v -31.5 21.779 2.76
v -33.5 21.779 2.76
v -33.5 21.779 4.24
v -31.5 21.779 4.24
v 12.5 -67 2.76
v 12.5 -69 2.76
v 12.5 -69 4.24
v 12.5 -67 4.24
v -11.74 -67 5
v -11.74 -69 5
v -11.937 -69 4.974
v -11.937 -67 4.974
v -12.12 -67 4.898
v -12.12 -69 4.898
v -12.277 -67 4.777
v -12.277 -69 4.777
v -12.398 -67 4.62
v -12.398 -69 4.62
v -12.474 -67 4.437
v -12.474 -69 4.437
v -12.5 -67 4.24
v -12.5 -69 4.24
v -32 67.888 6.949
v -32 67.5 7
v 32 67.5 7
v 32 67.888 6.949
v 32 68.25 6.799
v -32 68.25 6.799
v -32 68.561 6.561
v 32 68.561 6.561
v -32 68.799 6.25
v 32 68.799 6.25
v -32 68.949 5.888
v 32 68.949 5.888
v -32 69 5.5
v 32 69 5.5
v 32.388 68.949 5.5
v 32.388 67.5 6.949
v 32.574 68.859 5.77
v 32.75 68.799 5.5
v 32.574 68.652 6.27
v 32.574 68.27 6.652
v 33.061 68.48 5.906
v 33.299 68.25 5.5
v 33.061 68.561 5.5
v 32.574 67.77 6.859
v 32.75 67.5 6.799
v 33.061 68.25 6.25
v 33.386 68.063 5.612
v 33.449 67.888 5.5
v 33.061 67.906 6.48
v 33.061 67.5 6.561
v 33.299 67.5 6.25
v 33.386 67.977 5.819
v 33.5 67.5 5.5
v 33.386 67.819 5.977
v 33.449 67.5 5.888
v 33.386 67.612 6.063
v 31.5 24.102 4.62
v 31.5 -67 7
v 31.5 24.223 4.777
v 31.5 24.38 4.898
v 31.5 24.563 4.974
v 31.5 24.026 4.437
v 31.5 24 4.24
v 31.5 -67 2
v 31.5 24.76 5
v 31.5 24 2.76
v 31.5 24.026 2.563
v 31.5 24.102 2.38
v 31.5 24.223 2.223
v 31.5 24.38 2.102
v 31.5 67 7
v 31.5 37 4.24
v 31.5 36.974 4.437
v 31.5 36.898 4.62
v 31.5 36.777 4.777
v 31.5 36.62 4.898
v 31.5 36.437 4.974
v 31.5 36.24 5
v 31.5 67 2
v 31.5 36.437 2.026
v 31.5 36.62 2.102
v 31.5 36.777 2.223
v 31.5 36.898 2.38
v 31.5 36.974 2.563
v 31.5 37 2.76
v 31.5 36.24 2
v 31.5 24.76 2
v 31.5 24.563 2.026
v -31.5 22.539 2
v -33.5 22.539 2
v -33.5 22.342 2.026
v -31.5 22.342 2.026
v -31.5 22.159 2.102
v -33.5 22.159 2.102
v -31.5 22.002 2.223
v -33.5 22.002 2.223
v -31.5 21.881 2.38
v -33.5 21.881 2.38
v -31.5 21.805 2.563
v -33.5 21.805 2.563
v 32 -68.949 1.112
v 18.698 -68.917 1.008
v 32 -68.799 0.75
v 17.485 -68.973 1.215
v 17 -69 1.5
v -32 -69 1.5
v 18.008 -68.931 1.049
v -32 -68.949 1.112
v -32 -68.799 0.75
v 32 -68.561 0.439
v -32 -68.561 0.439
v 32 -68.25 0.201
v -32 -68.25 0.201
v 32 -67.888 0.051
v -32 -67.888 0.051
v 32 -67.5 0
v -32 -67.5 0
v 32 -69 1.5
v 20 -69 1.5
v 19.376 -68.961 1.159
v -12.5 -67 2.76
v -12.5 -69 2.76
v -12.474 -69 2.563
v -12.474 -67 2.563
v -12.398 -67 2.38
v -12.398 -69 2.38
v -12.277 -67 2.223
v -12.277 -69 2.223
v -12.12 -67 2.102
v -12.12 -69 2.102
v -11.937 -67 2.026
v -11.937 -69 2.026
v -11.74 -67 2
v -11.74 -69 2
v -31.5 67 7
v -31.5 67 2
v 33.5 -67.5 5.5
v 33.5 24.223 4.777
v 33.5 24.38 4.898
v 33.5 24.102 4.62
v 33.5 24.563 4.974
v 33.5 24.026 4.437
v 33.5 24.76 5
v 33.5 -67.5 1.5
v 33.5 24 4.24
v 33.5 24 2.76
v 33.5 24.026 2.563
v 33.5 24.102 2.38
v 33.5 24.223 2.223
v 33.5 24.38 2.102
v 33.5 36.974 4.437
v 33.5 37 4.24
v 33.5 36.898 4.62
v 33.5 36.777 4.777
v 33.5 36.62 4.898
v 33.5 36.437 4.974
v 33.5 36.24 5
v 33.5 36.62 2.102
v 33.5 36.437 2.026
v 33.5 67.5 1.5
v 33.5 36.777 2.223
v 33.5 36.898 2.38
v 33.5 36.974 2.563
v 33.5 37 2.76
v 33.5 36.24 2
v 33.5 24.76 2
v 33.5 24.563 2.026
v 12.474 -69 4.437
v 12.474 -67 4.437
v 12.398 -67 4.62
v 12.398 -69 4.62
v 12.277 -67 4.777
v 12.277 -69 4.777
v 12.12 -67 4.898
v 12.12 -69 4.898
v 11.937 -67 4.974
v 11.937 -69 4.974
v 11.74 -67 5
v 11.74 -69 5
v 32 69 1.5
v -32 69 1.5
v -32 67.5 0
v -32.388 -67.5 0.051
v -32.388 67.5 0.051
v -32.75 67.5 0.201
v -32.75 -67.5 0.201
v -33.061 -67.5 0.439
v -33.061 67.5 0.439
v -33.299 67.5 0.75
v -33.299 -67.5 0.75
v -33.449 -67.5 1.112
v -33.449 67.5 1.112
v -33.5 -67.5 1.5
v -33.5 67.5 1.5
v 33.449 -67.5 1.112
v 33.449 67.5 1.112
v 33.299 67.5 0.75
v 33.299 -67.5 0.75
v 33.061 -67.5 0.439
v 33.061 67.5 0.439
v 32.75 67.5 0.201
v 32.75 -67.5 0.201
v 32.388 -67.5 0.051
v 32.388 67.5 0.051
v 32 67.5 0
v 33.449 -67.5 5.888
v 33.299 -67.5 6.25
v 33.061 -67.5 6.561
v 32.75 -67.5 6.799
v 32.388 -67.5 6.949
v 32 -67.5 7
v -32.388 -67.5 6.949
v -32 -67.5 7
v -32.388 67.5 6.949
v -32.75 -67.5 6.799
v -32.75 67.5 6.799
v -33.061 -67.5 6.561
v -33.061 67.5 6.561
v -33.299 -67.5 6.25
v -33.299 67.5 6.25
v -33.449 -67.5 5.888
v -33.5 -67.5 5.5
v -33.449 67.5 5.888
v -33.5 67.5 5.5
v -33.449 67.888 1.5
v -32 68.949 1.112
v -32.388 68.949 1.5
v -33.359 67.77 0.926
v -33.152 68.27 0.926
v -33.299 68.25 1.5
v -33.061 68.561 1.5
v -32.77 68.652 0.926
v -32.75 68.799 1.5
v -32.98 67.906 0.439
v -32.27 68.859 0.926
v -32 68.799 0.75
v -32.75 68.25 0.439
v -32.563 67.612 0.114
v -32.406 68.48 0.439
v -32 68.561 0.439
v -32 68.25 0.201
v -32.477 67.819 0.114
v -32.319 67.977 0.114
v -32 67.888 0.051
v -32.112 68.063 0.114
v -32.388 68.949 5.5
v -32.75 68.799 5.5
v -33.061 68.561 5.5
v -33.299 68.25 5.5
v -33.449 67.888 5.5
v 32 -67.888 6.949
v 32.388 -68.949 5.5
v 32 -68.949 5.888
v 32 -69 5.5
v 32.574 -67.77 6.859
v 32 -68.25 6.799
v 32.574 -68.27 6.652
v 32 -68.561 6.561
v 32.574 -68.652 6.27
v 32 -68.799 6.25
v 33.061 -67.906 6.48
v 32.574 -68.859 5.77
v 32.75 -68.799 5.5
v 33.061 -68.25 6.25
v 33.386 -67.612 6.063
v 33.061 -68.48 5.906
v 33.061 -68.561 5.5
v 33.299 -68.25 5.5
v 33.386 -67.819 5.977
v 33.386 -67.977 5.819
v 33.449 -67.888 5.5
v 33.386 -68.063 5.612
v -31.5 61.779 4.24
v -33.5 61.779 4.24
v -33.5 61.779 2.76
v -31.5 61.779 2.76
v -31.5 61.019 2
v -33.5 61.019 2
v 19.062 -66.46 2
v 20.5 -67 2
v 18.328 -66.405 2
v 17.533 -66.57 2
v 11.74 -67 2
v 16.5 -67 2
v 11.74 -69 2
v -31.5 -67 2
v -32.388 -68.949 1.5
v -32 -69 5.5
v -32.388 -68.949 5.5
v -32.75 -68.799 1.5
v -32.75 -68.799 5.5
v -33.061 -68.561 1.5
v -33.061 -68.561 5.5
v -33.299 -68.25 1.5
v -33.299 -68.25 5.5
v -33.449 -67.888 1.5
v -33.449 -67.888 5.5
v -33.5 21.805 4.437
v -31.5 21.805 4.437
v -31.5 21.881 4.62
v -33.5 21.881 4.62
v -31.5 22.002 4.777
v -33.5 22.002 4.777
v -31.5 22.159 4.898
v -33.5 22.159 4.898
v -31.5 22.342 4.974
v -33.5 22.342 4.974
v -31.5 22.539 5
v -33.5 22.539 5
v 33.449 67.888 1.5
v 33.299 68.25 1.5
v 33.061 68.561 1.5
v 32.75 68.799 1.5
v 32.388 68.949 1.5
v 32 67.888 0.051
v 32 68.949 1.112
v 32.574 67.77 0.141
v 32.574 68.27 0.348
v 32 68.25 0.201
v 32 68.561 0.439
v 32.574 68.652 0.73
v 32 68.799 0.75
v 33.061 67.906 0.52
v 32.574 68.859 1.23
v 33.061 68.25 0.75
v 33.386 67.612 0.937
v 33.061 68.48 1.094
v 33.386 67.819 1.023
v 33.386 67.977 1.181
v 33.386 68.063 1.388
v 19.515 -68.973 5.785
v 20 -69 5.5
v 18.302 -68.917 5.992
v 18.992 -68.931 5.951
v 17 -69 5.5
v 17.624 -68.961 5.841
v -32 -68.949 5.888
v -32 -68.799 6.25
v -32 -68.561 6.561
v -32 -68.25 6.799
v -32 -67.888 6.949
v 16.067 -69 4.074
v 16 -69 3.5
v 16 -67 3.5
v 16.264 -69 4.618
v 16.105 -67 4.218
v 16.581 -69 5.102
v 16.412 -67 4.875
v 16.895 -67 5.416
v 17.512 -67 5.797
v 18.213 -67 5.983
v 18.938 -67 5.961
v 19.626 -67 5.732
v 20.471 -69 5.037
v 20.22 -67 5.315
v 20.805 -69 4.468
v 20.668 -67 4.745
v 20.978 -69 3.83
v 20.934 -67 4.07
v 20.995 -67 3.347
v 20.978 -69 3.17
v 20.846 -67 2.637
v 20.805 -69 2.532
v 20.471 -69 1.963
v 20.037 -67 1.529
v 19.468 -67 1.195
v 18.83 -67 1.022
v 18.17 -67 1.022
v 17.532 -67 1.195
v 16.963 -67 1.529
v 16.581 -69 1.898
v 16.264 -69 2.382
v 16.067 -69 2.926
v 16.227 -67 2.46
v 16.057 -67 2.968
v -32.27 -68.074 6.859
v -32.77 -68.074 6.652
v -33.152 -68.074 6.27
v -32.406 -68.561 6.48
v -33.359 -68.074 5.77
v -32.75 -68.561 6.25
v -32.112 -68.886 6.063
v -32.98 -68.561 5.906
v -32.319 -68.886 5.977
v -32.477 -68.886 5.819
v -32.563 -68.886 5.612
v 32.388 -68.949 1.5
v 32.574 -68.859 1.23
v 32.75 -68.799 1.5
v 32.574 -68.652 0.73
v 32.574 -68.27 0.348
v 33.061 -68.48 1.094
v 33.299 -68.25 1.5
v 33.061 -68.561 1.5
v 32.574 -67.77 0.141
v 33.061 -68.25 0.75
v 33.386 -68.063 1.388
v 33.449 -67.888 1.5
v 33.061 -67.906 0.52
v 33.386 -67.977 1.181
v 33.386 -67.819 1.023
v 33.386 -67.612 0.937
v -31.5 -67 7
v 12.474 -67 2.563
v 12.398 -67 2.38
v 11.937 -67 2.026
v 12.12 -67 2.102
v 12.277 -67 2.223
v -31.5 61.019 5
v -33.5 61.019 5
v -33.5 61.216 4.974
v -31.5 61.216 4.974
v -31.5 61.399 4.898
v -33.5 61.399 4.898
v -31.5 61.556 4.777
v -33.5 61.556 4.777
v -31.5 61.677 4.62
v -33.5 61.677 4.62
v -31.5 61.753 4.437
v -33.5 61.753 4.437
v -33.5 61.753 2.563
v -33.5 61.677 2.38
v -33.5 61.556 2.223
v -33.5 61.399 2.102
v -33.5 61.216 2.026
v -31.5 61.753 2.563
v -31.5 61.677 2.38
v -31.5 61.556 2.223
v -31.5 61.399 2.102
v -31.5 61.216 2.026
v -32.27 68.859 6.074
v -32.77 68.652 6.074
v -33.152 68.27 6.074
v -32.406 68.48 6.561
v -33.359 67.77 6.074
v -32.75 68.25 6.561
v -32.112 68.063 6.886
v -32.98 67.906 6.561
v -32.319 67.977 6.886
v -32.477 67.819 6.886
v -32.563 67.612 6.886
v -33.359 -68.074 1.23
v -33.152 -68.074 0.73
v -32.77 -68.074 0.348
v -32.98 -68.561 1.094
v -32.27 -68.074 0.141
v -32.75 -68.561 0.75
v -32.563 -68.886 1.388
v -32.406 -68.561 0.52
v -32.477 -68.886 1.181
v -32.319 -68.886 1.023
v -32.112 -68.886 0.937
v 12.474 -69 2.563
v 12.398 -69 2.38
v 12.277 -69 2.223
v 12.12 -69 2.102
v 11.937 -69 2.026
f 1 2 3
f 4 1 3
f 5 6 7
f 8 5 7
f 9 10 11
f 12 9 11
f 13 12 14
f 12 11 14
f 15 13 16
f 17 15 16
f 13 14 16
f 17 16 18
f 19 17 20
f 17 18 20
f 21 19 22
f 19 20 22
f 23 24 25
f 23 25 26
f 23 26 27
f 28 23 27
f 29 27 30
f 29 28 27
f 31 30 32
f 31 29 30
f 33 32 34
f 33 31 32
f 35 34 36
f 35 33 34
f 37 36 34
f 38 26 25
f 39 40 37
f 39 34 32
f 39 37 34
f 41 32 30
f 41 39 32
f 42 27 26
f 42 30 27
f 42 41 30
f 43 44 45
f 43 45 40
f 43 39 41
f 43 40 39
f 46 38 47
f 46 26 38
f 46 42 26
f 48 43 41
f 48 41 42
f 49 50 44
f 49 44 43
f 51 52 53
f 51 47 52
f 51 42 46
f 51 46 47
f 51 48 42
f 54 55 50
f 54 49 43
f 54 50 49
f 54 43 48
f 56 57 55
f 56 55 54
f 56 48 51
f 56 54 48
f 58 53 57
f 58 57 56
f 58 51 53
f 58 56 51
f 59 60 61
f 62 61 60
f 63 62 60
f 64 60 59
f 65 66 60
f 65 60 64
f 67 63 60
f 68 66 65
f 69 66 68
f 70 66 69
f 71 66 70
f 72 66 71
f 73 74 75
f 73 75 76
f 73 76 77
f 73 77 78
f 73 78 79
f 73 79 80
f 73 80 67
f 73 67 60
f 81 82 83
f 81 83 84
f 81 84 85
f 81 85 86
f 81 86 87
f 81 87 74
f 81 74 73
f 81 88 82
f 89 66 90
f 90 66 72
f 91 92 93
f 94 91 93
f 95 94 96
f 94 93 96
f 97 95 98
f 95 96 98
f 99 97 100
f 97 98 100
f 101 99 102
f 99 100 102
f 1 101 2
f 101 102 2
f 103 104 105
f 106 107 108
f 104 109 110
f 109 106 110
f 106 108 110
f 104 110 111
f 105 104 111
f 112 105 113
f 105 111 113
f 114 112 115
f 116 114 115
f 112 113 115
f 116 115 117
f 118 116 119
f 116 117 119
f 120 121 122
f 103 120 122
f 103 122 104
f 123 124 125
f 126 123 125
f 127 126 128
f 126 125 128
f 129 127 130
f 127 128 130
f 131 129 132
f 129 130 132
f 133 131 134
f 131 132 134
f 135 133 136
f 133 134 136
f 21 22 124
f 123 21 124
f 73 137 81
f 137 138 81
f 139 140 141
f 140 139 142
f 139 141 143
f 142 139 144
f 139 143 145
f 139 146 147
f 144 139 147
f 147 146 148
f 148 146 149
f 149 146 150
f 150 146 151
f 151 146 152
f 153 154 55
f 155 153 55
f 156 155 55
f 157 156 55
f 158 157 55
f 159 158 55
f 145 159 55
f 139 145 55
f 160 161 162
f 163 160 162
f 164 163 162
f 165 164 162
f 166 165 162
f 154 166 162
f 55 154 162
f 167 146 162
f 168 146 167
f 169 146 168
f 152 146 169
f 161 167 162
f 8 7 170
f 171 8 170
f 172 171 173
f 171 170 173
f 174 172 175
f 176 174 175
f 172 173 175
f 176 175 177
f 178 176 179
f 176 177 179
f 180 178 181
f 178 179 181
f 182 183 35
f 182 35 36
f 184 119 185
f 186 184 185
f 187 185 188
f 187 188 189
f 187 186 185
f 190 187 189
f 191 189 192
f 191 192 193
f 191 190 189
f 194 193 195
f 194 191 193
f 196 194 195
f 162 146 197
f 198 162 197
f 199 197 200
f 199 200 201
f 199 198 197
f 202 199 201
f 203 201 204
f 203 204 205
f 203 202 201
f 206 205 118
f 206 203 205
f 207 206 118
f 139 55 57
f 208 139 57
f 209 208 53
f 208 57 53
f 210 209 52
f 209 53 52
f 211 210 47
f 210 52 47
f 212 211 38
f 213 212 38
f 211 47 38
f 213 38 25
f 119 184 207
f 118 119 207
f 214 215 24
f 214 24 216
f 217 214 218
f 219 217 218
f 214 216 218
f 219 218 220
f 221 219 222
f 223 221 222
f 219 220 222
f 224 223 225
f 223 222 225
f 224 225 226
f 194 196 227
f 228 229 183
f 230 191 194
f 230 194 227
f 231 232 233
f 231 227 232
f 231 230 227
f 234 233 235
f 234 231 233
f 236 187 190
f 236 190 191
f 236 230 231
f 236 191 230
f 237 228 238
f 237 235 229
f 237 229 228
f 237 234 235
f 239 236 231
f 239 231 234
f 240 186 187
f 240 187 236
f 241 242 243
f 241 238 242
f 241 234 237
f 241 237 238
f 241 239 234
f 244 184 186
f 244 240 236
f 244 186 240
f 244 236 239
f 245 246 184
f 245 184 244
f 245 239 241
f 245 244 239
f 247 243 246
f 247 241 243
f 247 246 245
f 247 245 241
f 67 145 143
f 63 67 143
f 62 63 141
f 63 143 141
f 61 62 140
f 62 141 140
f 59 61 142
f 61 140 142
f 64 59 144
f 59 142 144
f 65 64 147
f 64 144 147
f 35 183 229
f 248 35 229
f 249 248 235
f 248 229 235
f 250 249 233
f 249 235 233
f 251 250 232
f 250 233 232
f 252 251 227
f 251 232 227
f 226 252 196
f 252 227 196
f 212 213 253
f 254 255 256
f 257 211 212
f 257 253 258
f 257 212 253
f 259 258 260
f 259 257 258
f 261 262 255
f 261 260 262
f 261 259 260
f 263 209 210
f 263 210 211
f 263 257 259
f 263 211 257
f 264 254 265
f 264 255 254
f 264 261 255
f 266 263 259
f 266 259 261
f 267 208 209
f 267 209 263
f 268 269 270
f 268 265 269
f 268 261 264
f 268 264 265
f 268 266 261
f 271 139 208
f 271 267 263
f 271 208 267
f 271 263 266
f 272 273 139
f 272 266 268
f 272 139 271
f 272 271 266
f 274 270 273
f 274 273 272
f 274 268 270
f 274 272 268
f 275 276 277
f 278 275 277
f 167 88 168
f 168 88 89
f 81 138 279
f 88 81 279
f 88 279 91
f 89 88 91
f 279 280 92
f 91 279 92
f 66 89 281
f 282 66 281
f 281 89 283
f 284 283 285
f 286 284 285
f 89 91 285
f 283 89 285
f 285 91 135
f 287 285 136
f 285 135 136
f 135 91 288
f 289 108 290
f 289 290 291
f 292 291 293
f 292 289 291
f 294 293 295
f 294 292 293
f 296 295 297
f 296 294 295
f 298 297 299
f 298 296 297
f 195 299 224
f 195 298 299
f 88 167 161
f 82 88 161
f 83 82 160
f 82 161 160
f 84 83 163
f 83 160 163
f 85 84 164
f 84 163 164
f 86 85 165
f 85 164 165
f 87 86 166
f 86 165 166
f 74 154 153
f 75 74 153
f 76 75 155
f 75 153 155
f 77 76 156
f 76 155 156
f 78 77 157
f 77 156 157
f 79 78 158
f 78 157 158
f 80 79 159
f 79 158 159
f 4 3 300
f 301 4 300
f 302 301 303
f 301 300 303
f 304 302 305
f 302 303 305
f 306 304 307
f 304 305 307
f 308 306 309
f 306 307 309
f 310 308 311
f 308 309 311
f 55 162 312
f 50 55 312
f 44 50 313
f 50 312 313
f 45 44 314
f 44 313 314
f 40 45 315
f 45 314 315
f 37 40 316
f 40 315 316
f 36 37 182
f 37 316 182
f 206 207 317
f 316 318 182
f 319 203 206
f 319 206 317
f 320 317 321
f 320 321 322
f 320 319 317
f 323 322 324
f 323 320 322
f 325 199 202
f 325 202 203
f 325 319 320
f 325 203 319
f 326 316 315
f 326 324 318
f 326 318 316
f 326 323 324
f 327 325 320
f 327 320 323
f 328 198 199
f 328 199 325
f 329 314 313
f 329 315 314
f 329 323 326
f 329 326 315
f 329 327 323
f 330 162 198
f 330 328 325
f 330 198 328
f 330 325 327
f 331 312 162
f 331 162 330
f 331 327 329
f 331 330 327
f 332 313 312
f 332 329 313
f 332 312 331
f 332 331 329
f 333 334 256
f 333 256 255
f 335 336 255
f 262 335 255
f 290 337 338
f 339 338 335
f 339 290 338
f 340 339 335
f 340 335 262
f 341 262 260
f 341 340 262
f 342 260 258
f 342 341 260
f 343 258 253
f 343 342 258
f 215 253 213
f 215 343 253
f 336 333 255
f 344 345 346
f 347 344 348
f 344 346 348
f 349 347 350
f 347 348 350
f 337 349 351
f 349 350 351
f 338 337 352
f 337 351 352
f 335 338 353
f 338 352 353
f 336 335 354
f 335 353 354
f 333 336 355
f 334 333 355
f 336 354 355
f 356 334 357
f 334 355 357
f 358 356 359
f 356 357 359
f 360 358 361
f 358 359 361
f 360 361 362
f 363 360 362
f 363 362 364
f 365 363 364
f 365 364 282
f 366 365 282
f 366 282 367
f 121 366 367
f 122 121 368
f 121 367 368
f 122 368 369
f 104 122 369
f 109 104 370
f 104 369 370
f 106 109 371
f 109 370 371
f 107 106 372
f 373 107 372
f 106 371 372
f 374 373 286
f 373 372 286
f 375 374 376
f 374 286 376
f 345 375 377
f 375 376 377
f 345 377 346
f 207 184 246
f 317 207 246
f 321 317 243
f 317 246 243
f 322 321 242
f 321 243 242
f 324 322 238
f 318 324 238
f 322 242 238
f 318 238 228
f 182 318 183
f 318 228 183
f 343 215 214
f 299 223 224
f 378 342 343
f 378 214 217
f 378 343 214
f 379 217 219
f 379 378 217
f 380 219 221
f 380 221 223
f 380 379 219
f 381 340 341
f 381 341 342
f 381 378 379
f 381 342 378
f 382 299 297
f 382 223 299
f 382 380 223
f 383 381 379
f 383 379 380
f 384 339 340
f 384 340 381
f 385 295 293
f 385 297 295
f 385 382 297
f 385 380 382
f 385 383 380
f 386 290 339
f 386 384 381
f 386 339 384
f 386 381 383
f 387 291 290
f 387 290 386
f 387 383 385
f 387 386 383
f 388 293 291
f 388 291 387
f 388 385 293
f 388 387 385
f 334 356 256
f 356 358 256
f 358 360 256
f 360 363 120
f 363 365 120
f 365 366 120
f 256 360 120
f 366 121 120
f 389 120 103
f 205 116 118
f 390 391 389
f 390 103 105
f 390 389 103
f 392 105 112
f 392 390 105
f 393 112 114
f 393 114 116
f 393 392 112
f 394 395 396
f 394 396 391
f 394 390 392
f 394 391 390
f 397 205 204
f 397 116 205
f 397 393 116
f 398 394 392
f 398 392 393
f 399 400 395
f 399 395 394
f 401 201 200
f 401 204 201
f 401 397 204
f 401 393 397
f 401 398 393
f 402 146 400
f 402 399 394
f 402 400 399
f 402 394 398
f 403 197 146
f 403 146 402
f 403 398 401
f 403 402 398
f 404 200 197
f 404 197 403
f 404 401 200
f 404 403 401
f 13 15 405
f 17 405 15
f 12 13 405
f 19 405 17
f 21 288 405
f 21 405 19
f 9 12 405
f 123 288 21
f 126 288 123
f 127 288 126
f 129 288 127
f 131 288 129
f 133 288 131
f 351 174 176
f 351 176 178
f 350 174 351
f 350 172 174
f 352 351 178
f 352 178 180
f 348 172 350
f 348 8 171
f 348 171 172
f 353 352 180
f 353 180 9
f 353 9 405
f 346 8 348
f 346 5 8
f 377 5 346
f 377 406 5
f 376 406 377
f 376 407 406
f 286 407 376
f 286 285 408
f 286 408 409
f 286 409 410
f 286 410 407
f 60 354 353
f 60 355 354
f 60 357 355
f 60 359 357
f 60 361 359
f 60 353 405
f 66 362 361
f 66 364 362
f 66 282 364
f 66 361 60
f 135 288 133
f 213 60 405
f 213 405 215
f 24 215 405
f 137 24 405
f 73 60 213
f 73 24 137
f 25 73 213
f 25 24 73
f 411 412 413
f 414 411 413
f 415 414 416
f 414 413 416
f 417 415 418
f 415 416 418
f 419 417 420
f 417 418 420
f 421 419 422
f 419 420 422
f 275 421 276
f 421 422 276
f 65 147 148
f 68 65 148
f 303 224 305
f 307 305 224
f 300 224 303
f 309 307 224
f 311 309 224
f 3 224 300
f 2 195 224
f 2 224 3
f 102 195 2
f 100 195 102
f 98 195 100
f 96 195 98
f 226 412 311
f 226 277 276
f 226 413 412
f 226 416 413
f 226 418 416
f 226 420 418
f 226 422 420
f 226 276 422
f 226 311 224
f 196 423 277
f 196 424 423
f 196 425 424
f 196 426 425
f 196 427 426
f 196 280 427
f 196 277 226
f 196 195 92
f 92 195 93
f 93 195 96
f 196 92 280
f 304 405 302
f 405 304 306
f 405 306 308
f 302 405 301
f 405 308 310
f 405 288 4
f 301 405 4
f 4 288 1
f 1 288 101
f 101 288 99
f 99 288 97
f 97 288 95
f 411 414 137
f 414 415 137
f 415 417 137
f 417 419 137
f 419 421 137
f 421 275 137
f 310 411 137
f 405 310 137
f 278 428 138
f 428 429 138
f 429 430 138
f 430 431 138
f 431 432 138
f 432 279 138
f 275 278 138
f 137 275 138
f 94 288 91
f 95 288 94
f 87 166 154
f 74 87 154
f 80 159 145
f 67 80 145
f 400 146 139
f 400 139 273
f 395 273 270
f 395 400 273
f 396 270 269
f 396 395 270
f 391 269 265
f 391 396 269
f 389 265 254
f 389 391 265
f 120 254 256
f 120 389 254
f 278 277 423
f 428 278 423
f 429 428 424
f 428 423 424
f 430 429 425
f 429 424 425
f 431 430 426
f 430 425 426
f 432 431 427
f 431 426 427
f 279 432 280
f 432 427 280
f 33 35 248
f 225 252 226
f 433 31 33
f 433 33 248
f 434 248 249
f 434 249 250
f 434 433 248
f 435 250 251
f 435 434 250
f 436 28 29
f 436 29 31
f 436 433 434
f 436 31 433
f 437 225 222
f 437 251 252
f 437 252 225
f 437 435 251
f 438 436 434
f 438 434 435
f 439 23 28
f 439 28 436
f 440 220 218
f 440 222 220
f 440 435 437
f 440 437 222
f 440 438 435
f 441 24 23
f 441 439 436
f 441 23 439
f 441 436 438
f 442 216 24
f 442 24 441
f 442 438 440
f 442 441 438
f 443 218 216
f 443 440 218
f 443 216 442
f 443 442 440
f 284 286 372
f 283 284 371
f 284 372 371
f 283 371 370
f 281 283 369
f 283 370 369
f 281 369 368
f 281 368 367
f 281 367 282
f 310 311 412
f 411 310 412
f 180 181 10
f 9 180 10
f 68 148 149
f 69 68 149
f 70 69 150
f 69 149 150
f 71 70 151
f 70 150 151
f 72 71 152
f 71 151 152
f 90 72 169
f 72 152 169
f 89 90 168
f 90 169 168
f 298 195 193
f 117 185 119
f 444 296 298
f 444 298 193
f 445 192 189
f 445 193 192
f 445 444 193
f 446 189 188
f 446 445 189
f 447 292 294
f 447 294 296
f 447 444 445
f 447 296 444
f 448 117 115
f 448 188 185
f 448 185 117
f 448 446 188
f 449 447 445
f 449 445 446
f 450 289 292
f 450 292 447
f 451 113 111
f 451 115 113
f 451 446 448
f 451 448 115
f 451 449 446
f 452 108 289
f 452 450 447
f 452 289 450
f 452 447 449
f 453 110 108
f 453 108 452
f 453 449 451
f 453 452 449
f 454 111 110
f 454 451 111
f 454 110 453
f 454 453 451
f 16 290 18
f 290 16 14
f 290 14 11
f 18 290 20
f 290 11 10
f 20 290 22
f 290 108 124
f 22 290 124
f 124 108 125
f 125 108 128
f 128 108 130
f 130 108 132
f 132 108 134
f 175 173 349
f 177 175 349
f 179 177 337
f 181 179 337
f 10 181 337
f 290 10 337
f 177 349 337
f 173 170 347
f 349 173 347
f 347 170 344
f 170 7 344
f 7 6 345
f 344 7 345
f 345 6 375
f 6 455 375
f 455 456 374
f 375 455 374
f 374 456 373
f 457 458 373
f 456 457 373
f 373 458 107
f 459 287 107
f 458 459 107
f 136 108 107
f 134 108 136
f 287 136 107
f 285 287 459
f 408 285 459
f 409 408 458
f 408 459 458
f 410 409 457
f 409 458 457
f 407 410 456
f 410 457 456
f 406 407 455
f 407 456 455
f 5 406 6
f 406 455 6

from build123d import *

# Parameters (mm, degrees)
F0_W          = 67
F0_H          = 138
F1_DEPTH      = 7
F2_T          = -2
F4_DEPTH      = 2
F6_DEPTH      = 2
F8_DEPTH      = 2
F10_D         = 5
F10_DEPTH     = 2
F10_TIP       = 1.5021515476
F11_T1_DEPTH  = 135
F11_T3_DEPTH  = 64
F11_T5_DEPTH  = 4
F11_S9_W      = 1.5
F11_S9_H      = 1.5
F11_T10_DEPTH = 1.5
F11_S15_W     = 1.5
F11_S15_H     = 1.5
F11_T16_DEPTH = 1.5
F11_S21_W     = 1.5
F11_S21_H     = 1.5
F11_T22_DEPTH = 1.5
F11_S27_W     = 1.5
F11_S27_H     = 1.5
F11_T28_DEPTH = 1.5
F11_S33_W     = 1.5
F11_S33_H     = 1.5
F11_T34_DEPTH = 1.5
F11_S39_W     = 1.5
F11_S39_H     = 1.5
F11_T40_DEPTH = 1.5
F11_S45_W     = 1.5
F11_S45_H     = 1.5
F11_T46_DEPTH = 1.5
F11_S51_W     = 1.5
F11_S51_H     = 1.5
F11_T52_DEPTH = 1.5


# Not quite as in the source:
# - a fillet or chamfer that OpenCascade refuses, or shapes differently, is made with other operations: its cross-section is extruded or revolved along the edge and cut away or added


with BuildPart() as f1:
    # F0 (on Top) → F1 (new body)
    with BuildSketch(Plane.XY):
        Rectangle(F0_W, F0_H)
    extrude(amount=F1_DEPTH)

    # F2
    f2_openings = [f1.faces().sort_by_distance(p)[0] for p in [
        (0, 0, 7),
    ]]
    offset(amount=F2_T, openings=f2_openings)

    # F3 (on face) → F4 (cut, through all)
    with BuildSketch(Plane(origin=(-33.5, 0, 0), x_dir=(0, -1, 0), z_dir=(-1, 0, 0))):
        with BuildLine():
            Line((-22.538946541, 5), (-61.0191351455, 5))
            ThreePointArc((-61.0191351455, 5), (-61.5564696174, 4.7774287742), (-61.7790408432, 4.2400943022))
            Line((-61.7790408432, 4.2400943022), (-61.7790408432, 2.7599056978))
            ThreePointArc((-61.7790408432, 2.7599056978), (-61.5564696174, 2.2225712258), (-61.0191351455, 2))
            Line((-61.0191351455, 2), (-22.538946541, 2))
            ThreePointArc((-22.538946541, 2), (-22.0016120691, 2.2225712258), (-21.7790408432, 2.7599056978))
            Line((-21.7790408432, 2.7599056978), (-21.7790408432, 4.2400943022))
            ThreePointArc((-21.7790408432, 4.2400943022), (-22.0016120691, 4.7774287742), (-22.538946541, 5))
        make_face()
    extrude(amount=-F4_DEPTH, mode=Mode.SUBTRACT)

    # F5 (on face) → F6 (cut, through all)
    with BuildSketch(Plane.YZ.offset(33.5)):
        with BuildLine():
            Line((36.2400943022, 5), (24.7599056978, 5))
            ThreePointArc((24.7599056978, 5), (24.2225712258, 4.7774287742), (24, 4.2400943022))
            Line((24, 4.2400943022), (24, 2.7599056978))
            ThreePointArc((24, 2.7599056978), (24.2225712258, 2.2225712258), (24.7599056978, 2))
            Line((24.7599056978, 2), (36.2400943022, 2))
            ThreePointArc((36.2400943022, 2), (36.7774287742, 2.2225712258), (37, 2.7599056978))
            Line((37, 2.7599056978), (37, 4.2400943022))
            ThreePointArc((37, 4.2400943022), (36.7774287742, 4.7774287742), (36.2400943022, 5))
        make_face()
    extrude(amount=-F6_DEPTH, mode=Mode.SUBTRACT)

    # F7 (on face) → F8 (cut, through all)
    with BuildSketch(Plane.XZ.offset(69)):
        with BuildLine():
            Line((11.7400943022, 5), (-11.7400943022, 5))
            ThreePointArc((-11.7400943022, 5), (-12.2774287742, 4.7774287742), (-12.5, 4.2400943022))
            Line((-12.5, 4.2400943022), (-12.5, 2.7599056978))
            ThreePointArc((-12.5, 2.7599056978), (-12.2774287742, 2.2225712258), (-11.7400943022, 2))
            Line((-11.7400943022, 2), (11.7400943022, 2))
            ThreePointArc((11.7400943022, 2), (12.2774287742, 2.2225712258), (12.5, 2.7599056978))
            Line((12.5, 2.7599056978), (12.5, 4.2400943022))
            ThreePointArc((12.5, 4.2400943022), (12.2774287742, 4.7774287742), (11.7400943022, 5))
        make_face()
    extrude(amount=-F8_DEPTH, mode=Mode.SUBTRACT)

    # F10
    with Locations(Plane.XZ.offset(69)):
        with Locations((18.5, 3.5)):
            Hole(F10_D / 2, depth=F10_DEPTH)
            with Locations((0, 0, -(F10_DEPTH + F10_TIP / 2))):  # 118° drill point
                Cone(0, F10_D / 2, F10_TIP, mode=Mode.SUBTRACT)

    # F11: fillet of radius 1.5 on 12 edges, made by hand

    # F11_s2 → F11_t1 (cut)
    with BuildSketch(Plane.XZ.offset(-67.5)):
        with BuildLine():
            ThreePointArc((33.5, 5.5), (33.0606601718, 6.5606601718), (32, 7))
            Line((32, 7), (33.5, 7))
            Line((33.5, 7), (33.5, 5.5))
        make_face()
        with BuildLine():
            ThreePointArc((33.5, 1.5), (33.0606601718, 0.4393398282), (32, 0))
            Line((32, 0), (33.5, 0))
            Line((33.5, 0), (33.5, 1.5))
        make_face()
        with BuildLine():
            ThreePointArc((-32, 7), (-33.0606601718, 6.5606601718), (-33.5, 5.5))
            Line((-33.5, 5.5), (-33.5, 7))
            Line((-33.5, 7), (-32, 7))
        make_face()
        with BuildLine():
            ThreePointArc((-32, 0), (-33.0606601718, 0.4393398282), (-33.5, 1.5))
            Line((-33.5, 1.5), (-33.5, 0))
            Line((-33.5, 0), (-32, 0))
        make_face()
    extrude(amount=F11_T1_DEPTH, mode=Mode.SUBTRACT)

    # F11_s4 → F11_t3 (cut)
    with BuildSketch(Plane.YZ.offset(-32)):
        with BuildLine():
            ThreePointArc((-69, 5.5), (-68.5606601718, 6.5606601718), (-67.5, 7))
            Line((-67.5, 7), (-69, 7))
            Line((-69, 7), (-69, 5.5))
        make_face()
        with BuildLine():
            ThreePointArc((-69, 1.5), (-68.5606601718, 0.4393398282), (-67.5, 0))
            Line((-67.5, 0), (-69, 0))
            Line((-69, 0), (-69, 1.5))
        make_face()
        with BuildLine():
            ThreePointArc((67.5, 7), (68.5606601718, 6.5606601718), (69, 5.5))
            Line((69, 5.5), (69, 7))
            Line((69, 7), (67.5, 7))
        make_face()
        with BuildLine():
            ThreePointArc((67.5, 0), (68.5606601718, 0.4393398282), (69, 1.5))
            Line((69, 1.5), (69, 0))
            Line((69, 0), (67.5, 0))
        make_face()
    extrude(amount=F11_T3_DEPTH, mode=Mode.SUBTRACT)

    # F11_s6 → F11_t5 (cut)
    with BuildSketch(Plane.XY.offset(1.5)):
        with BuildLine():
            ThreePointArc((33.5, -67.5), (33.0606601718, -68.5606601718), (32, -69))
            Line((32, -69), (33.5, -69))
            Line((33.5, -69), (33.5, -67.5))
        make_face()
        with BuildLine():
            ThreePointArc((33.5, 67.5), (33.0606601718, 68.5606601718), (32, 69))
            Line((32, 69), (33.5, 69))
            Line((33.5, 69), (33.5, 67.5))
        make_face()
        with BuildLine():
            ThreePointArc((-32, 69), (-33.0606601718, 68.5606601718), (-33.5, 67.5))
            Line((-33.5, 67.5), (-33.5, 69))
            Line((-33.5, 69), (-32, 69))
        make_face()
        with BuildLine():
            ThreePointArc((-32, -69), (-33.0606601718, -68.5606601718), (-33.5, -67.5))
            Line((-33.5, -67.5), (-33.5, -69))
            Line((-33.5, -69), (-32, -69))
        make_face()
    extrude(amount=F11_T5_DEPTH, mode=Mode.SUBTRACT)


with BuildPart() as f11_tool8:
    # F11_s9 → F11_t10 (new body)
    with BuildSketch(Plane.YZ.offset(32)):
        with Locations((-68.25, 6.25)):
            Rectangle(F11_S9_W, F11_S9_H)
    extrude(amount=F11_T10_DEPTH)

    # F11_s11 → F11_t12 (revolve, cut)
    with BuildSketch(Plane(origin=(32, -67.5, 5.5), x_dir=(0, 0.7071067812, -0.7071067812), z_dir=(0, -0.7071067812, -0.7071067812))):
        with BuildLine():
            ThreePointArc((0, -1.5), (1.5, 0), (0, 1.5))
            Line((0, 1.5), (0, -1.5))
        make_face()
    revolve(axis=Axis((32, -67.5, 5.5), (1, 0, 0)), mode=Mode.SUBTRACT)


with BuildPart() as f1_1:
    add(f1.part)

    # F11_t7: cut F11_tool8
    add(f11_tool8.part, mode=Mode.SUBTRACT)


with BuildPart() as f11_tool14:
    # F11_s15 → F11_t16 (new body)
    with BuildSketch(Plane.YZ.offset(32)):
        with Locations((68.25, 6.25)):
            Rectangle(F11_S15_W, F11_S15_H)
    extrude(amount=F11_T16_DEPTH)

    # F11_s17 → F11_t18 (revolve, cut)
    with BuildSketch(Plane(origin=(32, 67.5, 5.5), x_dir=(0, -0.7071067812, -0.7071067812), z_dir=(0, -0.7071067812, 0.7071067812))):
        with BuildLine():
            ThreePointArc((0, -1.5), (1.5, 0), (0, 1.5))
            Line((0, 1.5), (0, -1.5))
        make_face()
    revolve(axis=Axis((32, 67.5, 5.5), (1, 0, 0)), mode=Mode.SUBTRACT)


with BuildPart() as f1_2:
    add(f1_1.part)

    # F11_t13: cut F11_tool14
    add(f11_tool14.part, mode=Mode.SUBTRACT)


with BuildPart() as f11_tool20:
    # F11_s21 → F11_t22 (new body)
    with BuildSketch(Plane.XZ.offset(67.5)):
        with Locations((-32.75, 6.25)):
            Rectangle(F11_S21_W, F11_S21_H)
    extrude(amount=F11_T22_DEPTH)

    # F11_s23 → F11_t24 (revolve, cut)
    with BuildSketch(Plane(origin=(-32, -67.5, 5.5), x_dir=(0.7071067812, 0, -0.7071067812), z_dir=(-0.7071067812, 0, -0.7071067812))):
        with BuildLine():
            ThreePointArc((0, -1.5), (1.5, 0), (0, 1.5))
            Line((0, 1.5), (0, -1.5))
        make_face()
    revolve(axis=Axis((-32, -67.5, 5.5), (0, -1, 0)), mode=Mode.SUBTRACT)


with BuildPart() as f1_3:
    add(f1_2.part)

    # F11_t19: cut F11_tool20
    add(f11_tool20.part, mode=Mode.SUBTRACT)


with BuildPart() as f11_tool26:
    # F11_s27 → F11_t28 (new body)
    with BuildSketch(Plane.XZ.offset(67.5)):
        with Locations((-32.75, 0.75)):
            Rectangle(F11_S27_W, F11_S27_H)
    extrude(amount=F11_T28_DEPTH)

    # F11_s29 → F11_t30 (revolve, cut)
    with BuildSketch(Plane(origin=(-32, -67.5, 1.5), x_dir=(0.7071067812, 0, 0.7071067812), z_dir=(0.7071067812, 0, -0.7071067812))):
        with BuildLine():
            ThreePointArc((0, -1.5), (1.5, 0), (0, 1.5))
            Line((0, 1.5), (0, -1.5))
        make_face()
    revolve(axis=Axis((-32, -67.5, 1.5), (0, -1, 0)), mode=Mode.SUBTRACT)


with BuildPart() as f1_4:
    add(f1_3.part)

    # F11_t25: cut F11_tool26
    add(f11_tool26.part, mode=Mode.SUBTRACT)


with BuildPart() as f11_tool32:
    # F11_s33 → F11_t34 (new body)
    with BuildSketch(Plane.YZ.offset(32)):
        with Locations((-68.25, 0.75)):
            Rectangle(F11_S33_W, F11_S33_H)
    extrude(amount=F11_T34_DEPTH)

    # F11_s35 → F11_t36 (revolve, cut)
    with BuildSketch(Plane(origin=(32, -67.5, 1.5), x_dir=(0, 0.7071067812, 0.7071067812), z_dir=(0, 0.7071067812, -0.7071067812))):
        with BuildLine():
            ThreePointArc((0, -1.5), (1.5, 0), (0, 1.5))
            Line((0, 1.5), (0, -1.5))
        make_face()
    revolve(axis=Axis((32, -67.5, 1.5), (1, 0, 0)), mode=Mode.SUBTRACT)


with BuildPart() as f1_5:
    add(f1_4.part)

    # F11_t31: cut F11_tool32
    add(f11_tool32.part, mode=Mode.SUBTRACT)


with BuildPart() as f11_tool38:
    # F11_s39 → F11_t40 (new body)
    with BuildSketch(Plane.YZ.offset(32)):
        with Locations((68.25, 0.75)):
            Rectangle(F11_S39_W, F11_S39_H)
    extrude(amount=F11_T40_DEPTH)

    # F11_s41 → F11_t42 (revolve, cut)
    with BuildSketch(Plane(origin=(32, 67.5, 1.5), x_dir=(0, -0.7071067812, 0.7071067812), z_dir=(0, 0.7071067812, 0.7071067812))):
        with BuildLine():
            ThreePointArc((0, -1.5), (1.5, 0), (0, 1.5))
            Line((0, 1.5), (0, -1.5))
        make_face()
    revolve(axis=Axis((32, 67.5, 1.5), (1, 0, 0)), mode=Mode.SUBTRACT)


with BuildPart() as f1_6:
    add(f1_5.part)

    # F11_t37: cut F11_tool38
    add(f11_tool38.part, mode=Mode.SUBTRACT)


with BuildPart() as f11_tool44:
    # F11_s45 → F11_t46 (new body)
    with BuildSketch(Plane.XY.offset(5.5)):
        with Locations((-32.75, 68.25)):
            Rectangle(F11_S45_W, F11_S45_H)
    extrude(amount=F11_T46_DEPTH)

    # F11_s47 → F11_t48 (revolve, cut)
    with BuildSketch(Plane(origin=(-32, 67.5, 5.5), x_dir=(0.7071067812, -0.7071067812, 0), z_dir=(-0.7071067812, -0.7071067812, 0))):
        with BuildLine():
            ThreePointArc((0, -1.5), (1.5, 0), (0, 1.5))
            Line((0, 1.5), (0, -1.5))
        make_face()
    revolve(axis=Axis((-32, 67.5, 5.5), (0, 0, 1)), mode=Mode.SUBTRACT)


with BuildPart() as f1_7:
    add(f1_6.part)

    # F11_t43: cut F11_tool44
    add(f11_tool44.part, mode=Mode.SUBTRACT)


with BuildPart() as f11_tool50:
    # F11_s51 → F11_t52 (new body)
    with BuildSketch(Plane.XY.offset(1.5)):
        with Locations((-32.75, 68.25)):
            Rectangle(F11_S51_W, F11_S51_H)
    extrude(amount=-F11_T52_DEPTH)

    # F11_s53 → F11_t54 (revolve, cut)
    with BuildSketch(Plane(origin=(-32, 67.5, 1.5), x_dir=(0.7071067812, -0.7071067812, 0), z_dir=(0.7071067812, 0.7071067812, 0))):
        with BuildLine():
            ThreePointArc((0, -1.5), (1.5, 0), (0, 1.5))
            Line((0, 1.5), (0, -1.5))
        make_face()
    revolve(axis=Axis((-32, 67.5, 1.5), (0, 0, -1)), mode=Mode.SUBTRACT)


with BuildPart() as f1_8:
    add(f1_7.part)

    # F11_t49: cut F11_tool50
    add(f11_tool50.part, mode=Mode.SUBTRACT)


solid = f1_8.part
